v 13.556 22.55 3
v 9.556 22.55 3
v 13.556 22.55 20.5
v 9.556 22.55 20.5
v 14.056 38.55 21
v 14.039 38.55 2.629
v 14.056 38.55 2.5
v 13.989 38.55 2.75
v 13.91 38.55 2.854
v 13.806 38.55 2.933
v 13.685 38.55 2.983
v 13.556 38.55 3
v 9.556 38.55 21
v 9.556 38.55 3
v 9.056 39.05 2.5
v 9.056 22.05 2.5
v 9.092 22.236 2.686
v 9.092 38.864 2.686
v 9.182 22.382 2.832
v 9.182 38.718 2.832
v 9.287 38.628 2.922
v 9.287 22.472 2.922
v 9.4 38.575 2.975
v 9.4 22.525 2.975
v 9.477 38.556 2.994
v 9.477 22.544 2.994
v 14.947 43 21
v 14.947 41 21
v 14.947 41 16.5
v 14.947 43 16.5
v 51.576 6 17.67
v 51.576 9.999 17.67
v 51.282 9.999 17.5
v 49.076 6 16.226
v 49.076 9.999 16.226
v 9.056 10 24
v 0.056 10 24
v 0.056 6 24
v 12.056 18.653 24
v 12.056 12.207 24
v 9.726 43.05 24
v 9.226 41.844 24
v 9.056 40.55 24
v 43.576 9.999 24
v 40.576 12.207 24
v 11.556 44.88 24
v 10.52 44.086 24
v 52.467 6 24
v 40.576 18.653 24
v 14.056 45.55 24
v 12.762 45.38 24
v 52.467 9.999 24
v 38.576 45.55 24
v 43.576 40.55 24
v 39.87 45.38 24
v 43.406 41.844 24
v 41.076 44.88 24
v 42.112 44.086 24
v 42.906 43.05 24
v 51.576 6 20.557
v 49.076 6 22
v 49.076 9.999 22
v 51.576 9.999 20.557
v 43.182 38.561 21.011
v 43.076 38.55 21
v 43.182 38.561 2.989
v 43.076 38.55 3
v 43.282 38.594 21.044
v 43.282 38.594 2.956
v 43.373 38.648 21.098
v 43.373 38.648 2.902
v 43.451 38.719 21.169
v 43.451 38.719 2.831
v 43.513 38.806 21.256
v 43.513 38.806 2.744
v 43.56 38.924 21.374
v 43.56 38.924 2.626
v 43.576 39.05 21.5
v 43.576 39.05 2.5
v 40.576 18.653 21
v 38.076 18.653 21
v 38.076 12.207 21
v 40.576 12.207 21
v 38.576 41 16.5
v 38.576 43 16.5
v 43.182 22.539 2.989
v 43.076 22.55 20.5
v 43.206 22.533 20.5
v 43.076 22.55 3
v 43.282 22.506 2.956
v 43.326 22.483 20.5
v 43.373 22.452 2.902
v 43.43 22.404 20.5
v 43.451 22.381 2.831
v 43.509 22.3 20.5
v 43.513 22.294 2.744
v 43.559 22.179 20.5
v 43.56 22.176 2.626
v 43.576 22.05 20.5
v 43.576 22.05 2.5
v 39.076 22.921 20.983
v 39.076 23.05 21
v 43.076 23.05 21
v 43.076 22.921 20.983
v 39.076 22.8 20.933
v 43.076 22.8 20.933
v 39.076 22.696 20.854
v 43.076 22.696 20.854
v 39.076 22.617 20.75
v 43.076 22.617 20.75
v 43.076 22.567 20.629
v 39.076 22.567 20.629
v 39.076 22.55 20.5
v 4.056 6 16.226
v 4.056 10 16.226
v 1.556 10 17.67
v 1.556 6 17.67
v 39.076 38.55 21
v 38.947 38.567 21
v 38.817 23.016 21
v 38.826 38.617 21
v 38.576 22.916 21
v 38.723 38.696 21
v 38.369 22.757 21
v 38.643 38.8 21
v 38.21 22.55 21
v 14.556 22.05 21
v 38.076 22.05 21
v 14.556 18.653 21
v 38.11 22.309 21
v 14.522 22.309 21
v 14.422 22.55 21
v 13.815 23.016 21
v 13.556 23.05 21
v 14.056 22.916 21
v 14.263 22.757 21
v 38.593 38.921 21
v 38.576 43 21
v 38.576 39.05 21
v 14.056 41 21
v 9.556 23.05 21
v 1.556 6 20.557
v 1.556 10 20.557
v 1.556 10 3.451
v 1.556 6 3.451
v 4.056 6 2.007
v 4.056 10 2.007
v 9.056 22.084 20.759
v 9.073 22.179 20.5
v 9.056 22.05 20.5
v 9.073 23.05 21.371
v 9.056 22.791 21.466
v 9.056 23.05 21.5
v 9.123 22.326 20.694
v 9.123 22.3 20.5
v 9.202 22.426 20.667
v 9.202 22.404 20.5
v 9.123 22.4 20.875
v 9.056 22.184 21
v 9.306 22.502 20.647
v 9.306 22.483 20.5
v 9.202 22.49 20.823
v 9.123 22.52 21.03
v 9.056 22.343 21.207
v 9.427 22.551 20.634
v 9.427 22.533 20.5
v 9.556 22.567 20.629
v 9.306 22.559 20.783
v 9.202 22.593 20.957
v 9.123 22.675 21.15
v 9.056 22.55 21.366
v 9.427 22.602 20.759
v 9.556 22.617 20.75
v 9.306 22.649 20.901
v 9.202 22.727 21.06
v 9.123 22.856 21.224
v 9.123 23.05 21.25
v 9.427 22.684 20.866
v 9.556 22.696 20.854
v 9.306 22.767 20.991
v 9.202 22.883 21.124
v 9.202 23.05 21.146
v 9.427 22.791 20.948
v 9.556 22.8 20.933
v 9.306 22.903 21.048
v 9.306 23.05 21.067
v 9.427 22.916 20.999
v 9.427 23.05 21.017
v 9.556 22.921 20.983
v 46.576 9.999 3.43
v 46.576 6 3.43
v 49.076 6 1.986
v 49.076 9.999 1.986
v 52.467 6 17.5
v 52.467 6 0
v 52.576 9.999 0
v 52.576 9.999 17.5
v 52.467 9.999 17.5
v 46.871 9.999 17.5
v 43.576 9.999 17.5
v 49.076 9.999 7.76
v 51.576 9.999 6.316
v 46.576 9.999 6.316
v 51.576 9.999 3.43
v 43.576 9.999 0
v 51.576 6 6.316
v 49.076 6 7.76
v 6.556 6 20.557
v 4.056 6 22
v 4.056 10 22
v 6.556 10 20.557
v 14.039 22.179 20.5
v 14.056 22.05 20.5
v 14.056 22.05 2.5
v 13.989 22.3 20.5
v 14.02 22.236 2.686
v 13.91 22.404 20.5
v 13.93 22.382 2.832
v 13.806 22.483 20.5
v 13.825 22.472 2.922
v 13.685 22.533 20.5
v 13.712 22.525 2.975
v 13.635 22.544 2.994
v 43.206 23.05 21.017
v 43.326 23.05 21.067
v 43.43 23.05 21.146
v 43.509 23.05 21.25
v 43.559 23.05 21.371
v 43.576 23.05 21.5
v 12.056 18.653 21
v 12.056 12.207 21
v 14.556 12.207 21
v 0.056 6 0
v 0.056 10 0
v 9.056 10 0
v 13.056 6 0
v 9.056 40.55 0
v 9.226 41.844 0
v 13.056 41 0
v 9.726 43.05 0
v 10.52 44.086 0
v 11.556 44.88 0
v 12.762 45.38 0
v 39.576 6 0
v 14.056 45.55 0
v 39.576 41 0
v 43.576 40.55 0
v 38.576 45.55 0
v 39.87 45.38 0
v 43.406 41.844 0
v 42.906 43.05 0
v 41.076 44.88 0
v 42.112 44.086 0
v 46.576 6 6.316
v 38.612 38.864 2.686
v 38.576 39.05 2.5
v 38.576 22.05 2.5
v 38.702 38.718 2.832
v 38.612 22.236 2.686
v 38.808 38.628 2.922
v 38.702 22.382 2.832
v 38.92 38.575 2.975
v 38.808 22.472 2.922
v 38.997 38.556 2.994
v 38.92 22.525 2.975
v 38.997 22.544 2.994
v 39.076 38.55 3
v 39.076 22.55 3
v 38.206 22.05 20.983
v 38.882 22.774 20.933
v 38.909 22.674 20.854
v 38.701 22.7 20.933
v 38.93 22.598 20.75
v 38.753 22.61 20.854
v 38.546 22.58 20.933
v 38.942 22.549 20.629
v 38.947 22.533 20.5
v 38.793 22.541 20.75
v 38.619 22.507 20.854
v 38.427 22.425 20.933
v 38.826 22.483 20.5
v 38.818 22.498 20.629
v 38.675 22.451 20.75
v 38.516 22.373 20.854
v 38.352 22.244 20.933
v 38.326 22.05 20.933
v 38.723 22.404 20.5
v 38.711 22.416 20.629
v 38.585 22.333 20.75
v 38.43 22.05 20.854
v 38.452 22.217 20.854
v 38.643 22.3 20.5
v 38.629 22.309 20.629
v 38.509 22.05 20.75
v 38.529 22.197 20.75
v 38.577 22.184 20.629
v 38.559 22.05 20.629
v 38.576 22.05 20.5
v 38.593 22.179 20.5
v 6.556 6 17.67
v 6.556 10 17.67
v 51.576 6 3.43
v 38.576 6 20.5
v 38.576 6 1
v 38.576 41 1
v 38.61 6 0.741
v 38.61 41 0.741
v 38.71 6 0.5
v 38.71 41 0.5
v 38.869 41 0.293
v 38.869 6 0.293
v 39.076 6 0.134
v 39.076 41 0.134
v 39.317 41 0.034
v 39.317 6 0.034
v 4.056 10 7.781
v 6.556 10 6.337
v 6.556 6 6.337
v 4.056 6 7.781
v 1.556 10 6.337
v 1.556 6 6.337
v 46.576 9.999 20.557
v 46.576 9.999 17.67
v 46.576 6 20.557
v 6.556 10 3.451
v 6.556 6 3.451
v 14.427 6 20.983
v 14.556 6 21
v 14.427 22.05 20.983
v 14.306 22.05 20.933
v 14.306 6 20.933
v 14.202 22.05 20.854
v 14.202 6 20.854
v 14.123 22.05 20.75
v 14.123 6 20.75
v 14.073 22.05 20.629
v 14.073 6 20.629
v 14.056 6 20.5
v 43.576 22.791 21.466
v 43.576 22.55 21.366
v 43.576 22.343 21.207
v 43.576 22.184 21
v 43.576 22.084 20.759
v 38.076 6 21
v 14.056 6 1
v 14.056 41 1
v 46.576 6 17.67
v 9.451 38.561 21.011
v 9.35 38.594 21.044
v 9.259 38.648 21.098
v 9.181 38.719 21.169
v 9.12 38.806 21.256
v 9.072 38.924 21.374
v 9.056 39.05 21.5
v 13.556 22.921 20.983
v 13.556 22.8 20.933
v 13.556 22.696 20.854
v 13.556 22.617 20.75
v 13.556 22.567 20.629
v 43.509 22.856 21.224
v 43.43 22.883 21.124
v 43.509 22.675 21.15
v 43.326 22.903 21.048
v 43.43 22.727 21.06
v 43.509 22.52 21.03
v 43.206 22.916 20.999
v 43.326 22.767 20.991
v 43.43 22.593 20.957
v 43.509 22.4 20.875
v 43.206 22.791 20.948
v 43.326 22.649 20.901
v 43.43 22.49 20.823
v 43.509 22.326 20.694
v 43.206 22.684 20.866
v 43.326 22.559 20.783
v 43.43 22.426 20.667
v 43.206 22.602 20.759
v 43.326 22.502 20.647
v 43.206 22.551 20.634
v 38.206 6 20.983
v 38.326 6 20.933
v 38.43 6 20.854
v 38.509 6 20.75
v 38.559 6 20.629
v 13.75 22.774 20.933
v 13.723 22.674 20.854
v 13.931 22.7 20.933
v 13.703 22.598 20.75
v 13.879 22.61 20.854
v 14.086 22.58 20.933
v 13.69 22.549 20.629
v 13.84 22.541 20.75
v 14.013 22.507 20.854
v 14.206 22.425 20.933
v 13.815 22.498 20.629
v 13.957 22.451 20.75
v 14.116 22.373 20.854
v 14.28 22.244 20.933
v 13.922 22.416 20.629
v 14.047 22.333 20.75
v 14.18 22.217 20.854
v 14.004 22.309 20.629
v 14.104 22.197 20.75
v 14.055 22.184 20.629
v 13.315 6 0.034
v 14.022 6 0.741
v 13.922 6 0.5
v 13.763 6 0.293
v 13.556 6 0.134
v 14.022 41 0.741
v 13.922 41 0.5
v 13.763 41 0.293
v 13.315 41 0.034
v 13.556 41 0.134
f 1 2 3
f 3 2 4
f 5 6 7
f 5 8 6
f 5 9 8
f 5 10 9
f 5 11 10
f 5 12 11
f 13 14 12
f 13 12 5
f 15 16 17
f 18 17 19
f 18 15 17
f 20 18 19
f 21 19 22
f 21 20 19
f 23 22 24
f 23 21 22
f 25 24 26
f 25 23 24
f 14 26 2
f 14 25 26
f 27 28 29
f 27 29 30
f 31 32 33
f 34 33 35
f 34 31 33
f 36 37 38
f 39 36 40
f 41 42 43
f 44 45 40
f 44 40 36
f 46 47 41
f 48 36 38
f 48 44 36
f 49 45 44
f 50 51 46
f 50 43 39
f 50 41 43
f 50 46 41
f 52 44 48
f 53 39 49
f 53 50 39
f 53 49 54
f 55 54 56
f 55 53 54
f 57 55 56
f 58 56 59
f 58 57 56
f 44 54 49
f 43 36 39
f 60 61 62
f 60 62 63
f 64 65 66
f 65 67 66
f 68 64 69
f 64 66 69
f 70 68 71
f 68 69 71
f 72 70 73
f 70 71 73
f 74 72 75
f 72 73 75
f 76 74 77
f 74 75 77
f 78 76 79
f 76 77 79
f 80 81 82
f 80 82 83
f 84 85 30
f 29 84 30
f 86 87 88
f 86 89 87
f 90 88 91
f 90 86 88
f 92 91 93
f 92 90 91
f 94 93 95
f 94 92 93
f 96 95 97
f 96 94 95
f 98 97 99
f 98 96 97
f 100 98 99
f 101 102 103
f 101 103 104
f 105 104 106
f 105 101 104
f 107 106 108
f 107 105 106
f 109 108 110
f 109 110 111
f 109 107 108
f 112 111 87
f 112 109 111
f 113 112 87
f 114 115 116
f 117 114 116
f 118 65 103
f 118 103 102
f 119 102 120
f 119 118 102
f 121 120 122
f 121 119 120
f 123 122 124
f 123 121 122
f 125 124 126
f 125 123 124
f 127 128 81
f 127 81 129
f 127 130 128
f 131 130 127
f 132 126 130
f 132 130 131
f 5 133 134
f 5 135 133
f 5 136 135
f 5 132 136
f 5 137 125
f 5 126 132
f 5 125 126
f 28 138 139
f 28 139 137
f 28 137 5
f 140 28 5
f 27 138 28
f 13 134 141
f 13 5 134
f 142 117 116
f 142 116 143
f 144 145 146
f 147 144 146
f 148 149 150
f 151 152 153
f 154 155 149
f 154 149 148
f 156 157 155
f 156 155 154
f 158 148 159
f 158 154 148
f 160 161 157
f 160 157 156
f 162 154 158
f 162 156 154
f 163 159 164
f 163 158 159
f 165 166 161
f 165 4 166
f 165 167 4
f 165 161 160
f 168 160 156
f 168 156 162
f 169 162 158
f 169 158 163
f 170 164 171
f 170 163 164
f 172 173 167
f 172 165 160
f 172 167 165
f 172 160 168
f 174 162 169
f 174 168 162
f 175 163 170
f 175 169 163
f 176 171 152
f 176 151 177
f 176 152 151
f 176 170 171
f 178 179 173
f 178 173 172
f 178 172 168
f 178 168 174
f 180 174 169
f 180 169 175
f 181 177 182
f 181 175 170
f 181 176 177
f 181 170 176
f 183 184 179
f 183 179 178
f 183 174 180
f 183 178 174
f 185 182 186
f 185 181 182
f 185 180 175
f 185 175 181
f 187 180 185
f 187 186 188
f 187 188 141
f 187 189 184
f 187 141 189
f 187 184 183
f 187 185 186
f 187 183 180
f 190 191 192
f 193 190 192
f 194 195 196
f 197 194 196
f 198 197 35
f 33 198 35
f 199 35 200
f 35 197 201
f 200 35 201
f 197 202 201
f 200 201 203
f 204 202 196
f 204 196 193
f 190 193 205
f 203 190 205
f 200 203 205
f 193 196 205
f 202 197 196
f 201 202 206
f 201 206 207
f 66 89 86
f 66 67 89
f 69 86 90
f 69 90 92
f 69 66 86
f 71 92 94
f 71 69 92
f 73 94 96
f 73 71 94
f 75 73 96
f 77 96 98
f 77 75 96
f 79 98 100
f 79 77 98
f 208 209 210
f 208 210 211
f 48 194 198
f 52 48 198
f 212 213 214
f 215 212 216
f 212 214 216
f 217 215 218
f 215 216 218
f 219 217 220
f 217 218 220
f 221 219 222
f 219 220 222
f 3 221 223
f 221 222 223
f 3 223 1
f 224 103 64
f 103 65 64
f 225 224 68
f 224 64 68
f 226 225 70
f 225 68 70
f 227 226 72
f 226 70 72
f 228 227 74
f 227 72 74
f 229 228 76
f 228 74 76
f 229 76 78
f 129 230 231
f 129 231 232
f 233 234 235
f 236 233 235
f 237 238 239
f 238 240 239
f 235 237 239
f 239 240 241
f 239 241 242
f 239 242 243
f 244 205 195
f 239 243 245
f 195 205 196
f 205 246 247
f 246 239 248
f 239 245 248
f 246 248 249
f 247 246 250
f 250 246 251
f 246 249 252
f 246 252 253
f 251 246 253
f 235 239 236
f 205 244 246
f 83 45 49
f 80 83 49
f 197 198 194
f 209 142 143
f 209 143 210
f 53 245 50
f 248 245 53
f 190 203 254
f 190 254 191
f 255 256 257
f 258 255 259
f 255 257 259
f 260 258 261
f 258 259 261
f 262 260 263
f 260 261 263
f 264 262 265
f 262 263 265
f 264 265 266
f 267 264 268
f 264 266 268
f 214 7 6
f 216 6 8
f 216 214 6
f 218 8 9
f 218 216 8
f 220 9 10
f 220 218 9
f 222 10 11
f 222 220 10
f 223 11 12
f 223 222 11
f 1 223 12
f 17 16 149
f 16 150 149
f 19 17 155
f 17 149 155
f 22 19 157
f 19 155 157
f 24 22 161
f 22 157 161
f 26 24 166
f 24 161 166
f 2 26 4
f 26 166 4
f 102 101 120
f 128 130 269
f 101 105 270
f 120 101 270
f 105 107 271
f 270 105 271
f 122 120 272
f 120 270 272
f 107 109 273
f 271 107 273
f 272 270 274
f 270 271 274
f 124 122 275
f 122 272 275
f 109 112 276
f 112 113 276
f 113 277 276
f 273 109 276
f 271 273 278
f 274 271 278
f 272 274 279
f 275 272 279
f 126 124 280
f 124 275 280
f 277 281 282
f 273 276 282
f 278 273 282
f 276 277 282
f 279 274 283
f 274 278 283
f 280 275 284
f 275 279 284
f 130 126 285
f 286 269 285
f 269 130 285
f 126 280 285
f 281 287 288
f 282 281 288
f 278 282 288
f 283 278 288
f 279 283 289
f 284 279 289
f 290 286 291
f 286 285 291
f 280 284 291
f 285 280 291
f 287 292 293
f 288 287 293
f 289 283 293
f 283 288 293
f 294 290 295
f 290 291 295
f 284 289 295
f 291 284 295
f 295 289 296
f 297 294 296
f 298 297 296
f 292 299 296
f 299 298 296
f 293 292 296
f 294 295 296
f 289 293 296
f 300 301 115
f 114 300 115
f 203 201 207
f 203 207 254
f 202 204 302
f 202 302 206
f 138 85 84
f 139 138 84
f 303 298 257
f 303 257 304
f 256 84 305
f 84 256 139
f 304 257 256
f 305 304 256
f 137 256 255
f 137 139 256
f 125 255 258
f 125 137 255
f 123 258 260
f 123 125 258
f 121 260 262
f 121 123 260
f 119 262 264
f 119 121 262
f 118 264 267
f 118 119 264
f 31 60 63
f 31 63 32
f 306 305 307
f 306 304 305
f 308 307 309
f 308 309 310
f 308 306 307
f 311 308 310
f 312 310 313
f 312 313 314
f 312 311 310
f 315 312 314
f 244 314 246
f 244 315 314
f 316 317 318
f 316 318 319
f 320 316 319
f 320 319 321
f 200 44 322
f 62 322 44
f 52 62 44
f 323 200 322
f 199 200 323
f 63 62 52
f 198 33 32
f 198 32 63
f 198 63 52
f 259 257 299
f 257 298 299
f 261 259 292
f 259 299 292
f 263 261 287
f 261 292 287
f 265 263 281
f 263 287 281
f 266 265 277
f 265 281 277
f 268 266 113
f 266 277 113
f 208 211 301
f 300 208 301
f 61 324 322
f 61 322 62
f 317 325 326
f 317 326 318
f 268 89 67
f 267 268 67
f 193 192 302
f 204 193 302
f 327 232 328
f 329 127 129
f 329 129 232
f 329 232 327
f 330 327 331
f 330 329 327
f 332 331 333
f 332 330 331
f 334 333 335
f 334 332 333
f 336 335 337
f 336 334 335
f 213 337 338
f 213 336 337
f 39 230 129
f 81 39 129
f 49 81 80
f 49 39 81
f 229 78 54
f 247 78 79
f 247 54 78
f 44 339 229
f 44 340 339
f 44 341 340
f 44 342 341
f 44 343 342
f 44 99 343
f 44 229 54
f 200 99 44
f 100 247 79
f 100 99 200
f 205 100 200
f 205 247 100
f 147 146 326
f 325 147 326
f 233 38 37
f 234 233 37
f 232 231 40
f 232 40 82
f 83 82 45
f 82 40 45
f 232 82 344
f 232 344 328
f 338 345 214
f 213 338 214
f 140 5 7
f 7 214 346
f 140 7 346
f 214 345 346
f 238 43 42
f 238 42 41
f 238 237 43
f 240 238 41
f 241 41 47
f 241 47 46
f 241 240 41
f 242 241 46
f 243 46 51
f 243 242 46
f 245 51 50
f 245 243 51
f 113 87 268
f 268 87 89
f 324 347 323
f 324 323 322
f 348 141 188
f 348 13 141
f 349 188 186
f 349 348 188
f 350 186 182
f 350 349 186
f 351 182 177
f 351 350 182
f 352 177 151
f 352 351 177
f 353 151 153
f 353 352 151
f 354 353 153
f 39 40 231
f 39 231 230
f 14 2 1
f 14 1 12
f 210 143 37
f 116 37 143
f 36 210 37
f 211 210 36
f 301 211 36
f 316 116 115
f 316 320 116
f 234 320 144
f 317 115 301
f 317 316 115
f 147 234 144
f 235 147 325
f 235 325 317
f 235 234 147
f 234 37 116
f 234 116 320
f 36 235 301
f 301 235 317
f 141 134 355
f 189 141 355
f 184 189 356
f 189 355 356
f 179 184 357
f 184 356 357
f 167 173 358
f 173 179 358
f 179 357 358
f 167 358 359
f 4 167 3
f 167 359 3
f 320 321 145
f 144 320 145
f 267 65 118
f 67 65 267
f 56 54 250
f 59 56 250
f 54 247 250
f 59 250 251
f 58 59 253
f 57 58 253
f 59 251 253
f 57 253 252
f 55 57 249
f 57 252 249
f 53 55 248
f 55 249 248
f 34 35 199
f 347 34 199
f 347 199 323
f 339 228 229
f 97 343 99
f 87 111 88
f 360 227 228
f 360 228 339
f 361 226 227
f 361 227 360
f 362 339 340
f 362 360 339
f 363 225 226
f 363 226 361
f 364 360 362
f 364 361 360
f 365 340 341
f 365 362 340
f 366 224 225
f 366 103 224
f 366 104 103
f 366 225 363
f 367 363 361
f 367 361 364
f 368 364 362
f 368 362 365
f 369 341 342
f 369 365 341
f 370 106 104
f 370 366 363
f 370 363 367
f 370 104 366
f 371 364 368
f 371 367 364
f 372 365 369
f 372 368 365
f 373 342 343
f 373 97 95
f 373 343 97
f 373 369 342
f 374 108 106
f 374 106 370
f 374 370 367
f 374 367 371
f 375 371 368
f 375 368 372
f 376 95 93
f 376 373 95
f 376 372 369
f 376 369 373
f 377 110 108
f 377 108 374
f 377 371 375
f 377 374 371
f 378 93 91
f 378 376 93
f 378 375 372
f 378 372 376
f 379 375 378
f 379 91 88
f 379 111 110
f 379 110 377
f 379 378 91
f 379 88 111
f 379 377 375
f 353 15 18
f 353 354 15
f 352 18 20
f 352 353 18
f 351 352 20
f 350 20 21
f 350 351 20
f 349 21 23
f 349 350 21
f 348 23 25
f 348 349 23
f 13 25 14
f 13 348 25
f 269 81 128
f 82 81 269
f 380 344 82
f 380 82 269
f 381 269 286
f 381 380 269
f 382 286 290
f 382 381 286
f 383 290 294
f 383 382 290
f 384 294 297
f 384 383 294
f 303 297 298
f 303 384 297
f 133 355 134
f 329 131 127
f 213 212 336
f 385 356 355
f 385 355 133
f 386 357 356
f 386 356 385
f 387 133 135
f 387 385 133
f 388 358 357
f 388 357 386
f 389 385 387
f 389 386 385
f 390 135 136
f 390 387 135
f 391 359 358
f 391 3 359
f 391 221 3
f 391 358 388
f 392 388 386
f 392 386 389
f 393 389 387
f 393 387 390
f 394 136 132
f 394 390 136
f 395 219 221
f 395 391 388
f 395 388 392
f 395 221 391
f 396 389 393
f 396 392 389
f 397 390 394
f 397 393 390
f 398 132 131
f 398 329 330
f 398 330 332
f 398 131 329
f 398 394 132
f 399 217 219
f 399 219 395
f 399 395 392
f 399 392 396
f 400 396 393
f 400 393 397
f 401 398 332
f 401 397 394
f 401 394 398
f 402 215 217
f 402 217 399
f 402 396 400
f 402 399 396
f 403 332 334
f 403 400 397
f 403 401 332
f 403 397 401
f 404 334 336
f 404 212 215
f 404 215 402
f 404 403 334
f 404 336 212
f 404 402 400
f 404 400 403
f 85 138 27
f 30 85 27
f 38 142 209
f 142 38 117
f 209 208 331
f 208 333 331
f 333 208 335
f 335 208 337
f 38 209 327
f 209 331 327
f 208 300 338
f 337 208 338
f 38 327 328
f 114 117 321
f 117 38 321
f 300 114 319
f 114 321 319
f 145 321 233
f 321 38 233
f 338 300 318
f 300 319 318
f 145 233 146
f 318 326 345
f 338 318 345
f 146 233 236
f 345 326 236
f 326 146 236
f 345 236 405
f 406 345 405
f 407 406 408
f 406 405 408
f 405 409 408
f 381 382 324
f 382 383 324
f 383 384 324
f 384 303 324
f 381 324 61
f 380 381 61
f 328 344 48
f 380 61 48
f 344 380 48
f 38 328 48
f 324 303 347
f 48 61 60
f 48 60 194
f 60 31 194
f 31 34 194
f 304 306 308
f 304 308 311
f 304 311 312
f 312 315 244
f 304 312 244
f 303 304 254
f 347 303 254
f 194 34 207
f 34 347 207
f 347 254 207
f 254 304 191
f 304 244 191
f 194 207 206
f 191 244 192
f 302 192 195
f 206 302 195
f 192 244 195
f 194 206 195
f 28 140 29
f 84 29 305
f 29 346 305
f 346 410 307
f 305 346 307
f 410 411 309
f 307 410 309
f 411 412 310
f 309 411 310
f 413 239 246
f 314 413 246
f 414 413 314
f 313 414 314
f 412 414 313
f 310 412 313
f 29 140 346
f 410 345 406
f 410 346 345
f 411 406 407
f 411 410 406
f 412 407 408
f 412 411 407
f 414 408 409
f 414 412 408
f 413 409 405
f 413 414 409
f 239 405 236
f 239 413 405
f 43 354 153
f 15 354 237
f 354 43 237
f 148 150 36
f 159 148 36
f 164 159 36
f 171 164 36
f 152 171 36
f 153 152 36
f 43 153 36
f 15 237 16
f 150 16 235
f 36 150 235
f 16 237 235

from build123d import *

# Parameters (mm, degrees)
BOSS_EXTRUDE1_DEPTH     = 17.5
BOSS_EXTRUDE2_DEPTH     = 6.5
SKETCH4_W               = 24.52025143
SKETCH4_H               = 35
CUT_EXTRUDE1_DEPTH      = 3.5
SKETCH5_W               = 23.62971737
SKETCH5_H               = 2
CUT_EXTRUDE2_DEPTH      = 4.5
FILLET1_R               = 5
SKETCH7_W               = 9
SKETCH7_H               = 4
SKETCH7_W_2             = 8.890538969
SKETCH7_H_2             = 3.998522236
BOSS_EXTRUDE3_DEPTH     = 6.5
FILLET2_R               = 1
CUT_EXTRUDE4_REACH      = 69.415
SKETCH8_W               = 18
SKETCH8_H               = 16
FILLET3_R               = 0.5
CUT_EXTRUDE5_REACH      = 69.415
SKETCH9_W               = 18
SKETCH9_H               = 16
FILLET4_R               = 0.5
SKETCH10_W              = 28.52025143
SKETCH10_H              = 6.445257338
CUT_EXTRUDE6_DEPTH      = 3
CUT_EXTRUDE7_DEPTH      = 10
CUT_EXTRUDE7_DEPTH_BACK = 68.853985243


with BuildPart() as part:
    # Sketch1 → Boss-Extrude1 (new body)
    with BuildSketch(Plane.XY):
        Polygon((0.056027157, 6.000000005), (14.056027157, 6.000000005), (14.056027157, 41.000000005), (38.576278587, 41.000000005), (38.576278587, 6.000000005), (52.466817556, 6.000000005), (52.576278587, 9.99850201), (43.576278587, 9.998522241), (43.576278587, 39.558678923), (43.576278587, 45.550000005), (41.466812647, 45.550000005), (38.316152872, 45.550000005), (14.316152872, 45.550000005), (9.056027157, 45.550000005), (9.056027157, 39.558678923), (9.056027157, 10.000000005), (0.056027157, 10.000000005), align=None)
    extrude(amount=BOSS_EXTRUDE1_DEPTH)

    # Sketch2 → Boss-Extrude2 (add)
    with BuildSketch(Plane.XY.offset(17.5)):
        Polygon((9.056027157, 10.000000005), (9.056027157, 45.550000005), (43.576278587, 45.550000005), (43.576278587, 6.000000005), (9.056027157, 6.000000005), align=None)
    extrude(amount=BOSS_EXTRUDE2_DEPTH)

    # Sketch4 → Cut-Extrude1 (cut)
    with BuildSketch(Plane(origin=(0, 0, 17.5), x_dir=(-1, 0, 0), z_dir=(0, 0, -1))):
        with Locations((-26.316152872, 23.500000005)):
            Rectangle(SKETCH4_W, SKETCH4_H)
    extrude(amount=-CUT_EXTRUDE1_DEPTH, mode=Mode.SUBTRACT)

    # Sketch5 → Cut-Extrude2 (cut)
    with BuildSketch(Plane(origin=(0, 0, 21), x_dir=(-1, 0, 0), z_dir=(0, 0, -1))):
        with Locations((-26.761419902, 42.000000005)):
            Rectangle(SKETCH5_W, SKETCH5_H)
    extrude(amount=CUT_EXTRUDE2_DEPTH, mode=Mode.SUBTRACT)

    # Fillet1
    fillet1_edges = [part.edges().sort_by_distance(p)[0] for p in [
        (9.056027157, 45.550000005, 12),
        (43.576278587, 45.550000005, 12),
    ]]
    fillet(fillet1_edges, radius=FILLET1_R)

    # Sketch7 → Boss-Extrude3 (add, through all)
    with BuildSketch(Plane.XY.offset(17.5)):
        with Locations((4.556027157, 8.000000005)):
            Rectangle(SKETCH7_W, SKETCH7_H)
        with Locations((48.021548072, 7.999261123)):
            Rectangle(SKETCH7_W_2, SKETCH7_H_2)
    extrude(amount=BOSS_EXTRUDE3_DEPTH)

    # Fillet2
    fillet2_edges = [part.edges().sort_by_distance(p)[0] for p in [
        (38.576278587, 23.500000005, 0),
        (14.056027157, 23.500000005, 0),
    ]]
    fillet(fillet2_edges, radius=FILLET2_R)

    # Sketch8 → Cut-Extrude4 (cut, up to next)
    with BuildSketch(Plane.ZY.offset(-9.056027157), mode=Mode.PRIVATE) as cut_extrude4_sk1:
        with Locations((12, 30.550000005)):
            Rectangle(SKETCH8_W, SKETCH8_H)
    cut_extrude4_tool1 = extrude(cut_extrude4_sk1.sketch, amount=-CUT_EXTRUDE4_REACH, mode=Mode.PRIVATE) & part.part
    add(cut_extrude4_tool1.solids().sort_by_distance((9.056027, 30.55, 12))[0], mode=Mode.SUBTRACT)

    # Fillet3
    fillet3_edges = [part.edges().sort_by_distance(p)[0] for p in [
        (14.056027157, 30.550000005, 3),
        (14.056027157, 22.550000005, 12),
        (11.556027157, 22.550000005, 21),
        (9.056027157, 30.550000005, 3),
        (9.056027157, 22.550000005, 12),
        (9.056027157, 30.550000005, 21),
        (9.056027157, 38.550000005, 12),
        (14.056027157, 14.275000005, 21),
    ]]
    fillet(fillet3_edges, radius=FILLET3_R)

    # Sketch9 → Cut-Extrude5 (cut, up to next)
    with BuildSketch(Plane(origin=(43.576278587, 0, 0), x_dir=(0, 0, -1), z_dir=(1, 0, 0)), mode=Mode.PRIVATE) as cut_extrude5_sk1:
        with Locations((-12, 30.550000005)):
            Rectangle(SKETCH9_W, SKETCH9_H)
    cut_extrude5_tool1 = extrude(cut_extrude5_sk1.sketch, amount=-CUT_EXTRUDE5_REACH, mode=Mode.PRIVATE) & part.part
    add(cut_extrude5_tool1.solids().sort_by_distance((43.576279, 30.55, 12))[0], mode=Mode.SUBTRACT)

    # Fillet4
    fillet4_edges = [part.edges().sort_by_distance(p)[0] for p in [
        (38.576278587, 14.275000005, 21),
        (38.576278587, 38.550000005, 12),
        (38.576278587, 30.550000005, 3),
        (38.576278587, 22.550000005, 12),
        (41.076278587, 22.550000005, 21),
        (43.576278587, 30.550000005, 21),
        (43.576278587, 22.550000005, 12),
        (43.576278587, 30.550000005, 3),
        (43.576278587, 38.550000005, 12),
    ]]
    fillet(fillet4_edges, radius=FILLET4_R)

    # Sketch10 → Cut-Extrude6 (cut)
    with BuildSketch(Plane.XY.offset(24)):
        with Locations((26.316152872, 15.429934293)):
            Rectangle(SKETCH10_W, SKETCH10_H)
    extrude(amount=-CUT_EXTRUDE6_DEPTH, mode=Mode.SUBTRACT)

    # Sketch6 → Cut-Extrude7 (cut, two sides: drawn at the far end of the back side and taken through both)
    with BuildSketch(Plane(origin=(2.2475e-05, 9.998620193, 0), x_dir=(0.9999999999974737, -2.2478262975890884e-06, 0), z_dir=(2.2478262975890884e-06, 0.9999999999974737, 0)).offset(-CUT_EXTRUDE7_DEPTH_BACK)):
        Polygon((4.056004679, -22), (6.556004679, -20.556624327), (6.556004679, -17.669872981), (4.056004679, -16.226497308), (1.556004679, -17.669872981), (1.556004679, -20.556624327), align=None)
        Polygon((1.556004679, -3.450509855), (4.056004679, -2.007134182), (6.556004679, -3.450509855), (6.556004679, -6.337261201), (4.056004679, -7.780636874), (1.556004679, -6.337261201), align=None)
        Polygon((46.576256112, -3.429667879), (49.076256112, -1.986292206), (51.576256112, -3.429667879), (51.576256112, -6.316419225), (49.076256112, -7.759794898), (46.576256112, -6.316419225), align=None)
        Polygon((49.076256112, -22), (51.576256112, -20.556624327), (51.576256112, -17.669872981), (49.076256112, -16.226497308), (46.576256112, -17.669872981), (46.576256112, -20.556624327), align=None)
    extrude(amount=CUT_EXTRUDE7_DEPTH + CUT_EXTRUDE7_DEPTH_BACK, mode=Mode.SUBTRACT)


solid = part.part
